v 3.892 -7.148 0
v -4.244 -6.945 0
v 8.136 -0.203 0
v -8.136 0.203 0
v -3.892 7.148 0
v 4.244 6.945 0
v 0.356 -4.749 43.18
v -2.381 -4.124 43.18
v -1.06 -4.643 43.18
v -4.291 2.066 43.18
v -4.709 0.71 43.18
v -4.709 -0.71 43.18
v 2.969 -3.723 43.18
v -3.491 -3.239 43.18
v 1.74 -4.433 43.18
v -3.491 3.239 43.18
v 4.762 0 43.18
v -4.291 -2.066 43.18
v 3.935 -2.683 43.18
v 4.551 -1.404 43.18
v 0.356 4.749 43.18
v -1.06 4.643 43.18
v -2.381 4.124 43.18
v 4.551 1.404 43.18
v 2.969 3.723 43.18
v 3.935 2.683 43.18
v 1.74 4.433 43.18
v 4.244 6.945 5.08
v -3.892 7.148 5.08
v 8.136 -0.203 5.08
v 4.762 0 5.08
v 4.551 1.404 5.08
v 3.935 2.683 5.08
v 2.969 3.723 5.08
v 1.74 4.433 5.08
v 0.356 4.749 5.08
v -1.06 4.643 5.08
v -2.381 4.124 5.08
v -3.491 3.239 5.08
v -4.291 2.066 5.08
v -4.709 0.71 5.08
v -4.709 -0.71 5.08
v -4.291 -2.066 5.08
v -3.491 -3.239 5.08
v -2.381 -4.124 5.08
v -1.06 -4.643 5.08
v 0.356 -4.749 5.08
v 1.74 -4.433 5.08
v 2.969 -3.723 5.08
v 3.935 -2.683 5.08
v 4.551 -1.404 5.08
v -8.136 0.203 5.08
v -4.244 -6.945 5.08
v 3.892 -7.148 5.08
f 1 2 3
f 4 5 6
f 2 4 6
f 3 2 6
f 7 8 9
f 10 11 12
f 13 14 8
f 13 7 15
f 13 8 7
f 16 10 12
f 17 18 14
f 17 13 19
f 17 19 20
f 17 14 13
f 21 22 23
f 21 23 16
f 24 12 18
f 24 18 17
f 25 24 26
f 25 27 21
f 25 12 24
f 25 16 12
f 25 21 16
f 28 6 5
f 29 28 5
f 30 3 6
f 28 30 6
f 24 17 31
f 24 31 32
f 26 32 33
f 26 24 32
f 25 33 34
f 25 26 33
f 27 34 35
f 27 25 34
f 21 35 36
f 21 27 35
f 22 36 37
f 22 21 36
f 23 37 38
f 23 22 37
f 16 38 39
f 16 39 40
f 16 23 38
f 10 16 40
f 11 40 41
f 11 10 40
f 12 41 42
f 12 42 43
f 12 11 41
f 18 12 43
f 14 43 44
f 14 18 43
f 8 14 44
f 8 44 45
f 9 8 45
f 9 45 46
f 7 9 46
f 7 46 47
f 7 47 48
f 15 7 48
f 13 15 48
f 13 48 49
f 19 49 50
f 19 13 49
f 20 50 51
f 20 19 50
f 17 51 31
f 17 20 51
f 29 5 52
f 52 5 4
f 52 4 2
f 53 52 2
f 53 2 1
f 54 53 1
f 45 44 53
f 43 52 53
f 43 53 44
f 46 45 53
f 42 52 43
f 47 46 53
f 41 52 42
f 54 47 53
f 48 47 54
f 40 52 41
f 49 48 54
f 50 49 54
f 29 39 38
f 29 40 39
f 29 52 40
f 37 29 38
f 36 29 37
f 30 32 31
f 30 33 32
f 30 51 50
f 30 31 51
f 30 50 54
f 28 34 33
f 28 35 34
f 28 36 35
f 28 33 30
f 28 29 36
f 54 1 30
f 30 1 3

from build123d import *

# Parameters (mm, degrees)
EXTRUDE1_DEPTH    = 43.18
SKETCH2_OUTSIDE_W = 27.934
SKETCH2_OUTSIDE_H = 25.958
SKETCH2_OUTSIDE_R = 4.7625
EXTRUDE2_DEPTH    = 38.1


with BuildPart() as part:
    # Sketch1 → Extrude1 (new body)
    with BuildSketch(Plane.XY):
        Polygon((4.244335179, 6.944596596), (-3.892029482, 7.148000386), (-8.136364661, 0.203403789), (-4.244335179, -6.944596596), (3.892029482, -7.148000386), (8.136364661, -0.203403789), align=None)
    extrude(amount=EXTRUDE1_DEPTH)

    # Sketch2 outside → Extrude2 (cut)
    with BuildSketch(Plane.XY.offset(43.18)):
        Rectangle(SKETCH2_OUTSIDE_W, SKETCH2_OUTSIDE_H)
        Circle(SKETCH2_OUTSIDE_R, mode=Mode.SUBTRACT)
    extrude(amount=-EXTRUDE2_DEPTH, mode=Mode.SUBTRACT)


solid = part.part
